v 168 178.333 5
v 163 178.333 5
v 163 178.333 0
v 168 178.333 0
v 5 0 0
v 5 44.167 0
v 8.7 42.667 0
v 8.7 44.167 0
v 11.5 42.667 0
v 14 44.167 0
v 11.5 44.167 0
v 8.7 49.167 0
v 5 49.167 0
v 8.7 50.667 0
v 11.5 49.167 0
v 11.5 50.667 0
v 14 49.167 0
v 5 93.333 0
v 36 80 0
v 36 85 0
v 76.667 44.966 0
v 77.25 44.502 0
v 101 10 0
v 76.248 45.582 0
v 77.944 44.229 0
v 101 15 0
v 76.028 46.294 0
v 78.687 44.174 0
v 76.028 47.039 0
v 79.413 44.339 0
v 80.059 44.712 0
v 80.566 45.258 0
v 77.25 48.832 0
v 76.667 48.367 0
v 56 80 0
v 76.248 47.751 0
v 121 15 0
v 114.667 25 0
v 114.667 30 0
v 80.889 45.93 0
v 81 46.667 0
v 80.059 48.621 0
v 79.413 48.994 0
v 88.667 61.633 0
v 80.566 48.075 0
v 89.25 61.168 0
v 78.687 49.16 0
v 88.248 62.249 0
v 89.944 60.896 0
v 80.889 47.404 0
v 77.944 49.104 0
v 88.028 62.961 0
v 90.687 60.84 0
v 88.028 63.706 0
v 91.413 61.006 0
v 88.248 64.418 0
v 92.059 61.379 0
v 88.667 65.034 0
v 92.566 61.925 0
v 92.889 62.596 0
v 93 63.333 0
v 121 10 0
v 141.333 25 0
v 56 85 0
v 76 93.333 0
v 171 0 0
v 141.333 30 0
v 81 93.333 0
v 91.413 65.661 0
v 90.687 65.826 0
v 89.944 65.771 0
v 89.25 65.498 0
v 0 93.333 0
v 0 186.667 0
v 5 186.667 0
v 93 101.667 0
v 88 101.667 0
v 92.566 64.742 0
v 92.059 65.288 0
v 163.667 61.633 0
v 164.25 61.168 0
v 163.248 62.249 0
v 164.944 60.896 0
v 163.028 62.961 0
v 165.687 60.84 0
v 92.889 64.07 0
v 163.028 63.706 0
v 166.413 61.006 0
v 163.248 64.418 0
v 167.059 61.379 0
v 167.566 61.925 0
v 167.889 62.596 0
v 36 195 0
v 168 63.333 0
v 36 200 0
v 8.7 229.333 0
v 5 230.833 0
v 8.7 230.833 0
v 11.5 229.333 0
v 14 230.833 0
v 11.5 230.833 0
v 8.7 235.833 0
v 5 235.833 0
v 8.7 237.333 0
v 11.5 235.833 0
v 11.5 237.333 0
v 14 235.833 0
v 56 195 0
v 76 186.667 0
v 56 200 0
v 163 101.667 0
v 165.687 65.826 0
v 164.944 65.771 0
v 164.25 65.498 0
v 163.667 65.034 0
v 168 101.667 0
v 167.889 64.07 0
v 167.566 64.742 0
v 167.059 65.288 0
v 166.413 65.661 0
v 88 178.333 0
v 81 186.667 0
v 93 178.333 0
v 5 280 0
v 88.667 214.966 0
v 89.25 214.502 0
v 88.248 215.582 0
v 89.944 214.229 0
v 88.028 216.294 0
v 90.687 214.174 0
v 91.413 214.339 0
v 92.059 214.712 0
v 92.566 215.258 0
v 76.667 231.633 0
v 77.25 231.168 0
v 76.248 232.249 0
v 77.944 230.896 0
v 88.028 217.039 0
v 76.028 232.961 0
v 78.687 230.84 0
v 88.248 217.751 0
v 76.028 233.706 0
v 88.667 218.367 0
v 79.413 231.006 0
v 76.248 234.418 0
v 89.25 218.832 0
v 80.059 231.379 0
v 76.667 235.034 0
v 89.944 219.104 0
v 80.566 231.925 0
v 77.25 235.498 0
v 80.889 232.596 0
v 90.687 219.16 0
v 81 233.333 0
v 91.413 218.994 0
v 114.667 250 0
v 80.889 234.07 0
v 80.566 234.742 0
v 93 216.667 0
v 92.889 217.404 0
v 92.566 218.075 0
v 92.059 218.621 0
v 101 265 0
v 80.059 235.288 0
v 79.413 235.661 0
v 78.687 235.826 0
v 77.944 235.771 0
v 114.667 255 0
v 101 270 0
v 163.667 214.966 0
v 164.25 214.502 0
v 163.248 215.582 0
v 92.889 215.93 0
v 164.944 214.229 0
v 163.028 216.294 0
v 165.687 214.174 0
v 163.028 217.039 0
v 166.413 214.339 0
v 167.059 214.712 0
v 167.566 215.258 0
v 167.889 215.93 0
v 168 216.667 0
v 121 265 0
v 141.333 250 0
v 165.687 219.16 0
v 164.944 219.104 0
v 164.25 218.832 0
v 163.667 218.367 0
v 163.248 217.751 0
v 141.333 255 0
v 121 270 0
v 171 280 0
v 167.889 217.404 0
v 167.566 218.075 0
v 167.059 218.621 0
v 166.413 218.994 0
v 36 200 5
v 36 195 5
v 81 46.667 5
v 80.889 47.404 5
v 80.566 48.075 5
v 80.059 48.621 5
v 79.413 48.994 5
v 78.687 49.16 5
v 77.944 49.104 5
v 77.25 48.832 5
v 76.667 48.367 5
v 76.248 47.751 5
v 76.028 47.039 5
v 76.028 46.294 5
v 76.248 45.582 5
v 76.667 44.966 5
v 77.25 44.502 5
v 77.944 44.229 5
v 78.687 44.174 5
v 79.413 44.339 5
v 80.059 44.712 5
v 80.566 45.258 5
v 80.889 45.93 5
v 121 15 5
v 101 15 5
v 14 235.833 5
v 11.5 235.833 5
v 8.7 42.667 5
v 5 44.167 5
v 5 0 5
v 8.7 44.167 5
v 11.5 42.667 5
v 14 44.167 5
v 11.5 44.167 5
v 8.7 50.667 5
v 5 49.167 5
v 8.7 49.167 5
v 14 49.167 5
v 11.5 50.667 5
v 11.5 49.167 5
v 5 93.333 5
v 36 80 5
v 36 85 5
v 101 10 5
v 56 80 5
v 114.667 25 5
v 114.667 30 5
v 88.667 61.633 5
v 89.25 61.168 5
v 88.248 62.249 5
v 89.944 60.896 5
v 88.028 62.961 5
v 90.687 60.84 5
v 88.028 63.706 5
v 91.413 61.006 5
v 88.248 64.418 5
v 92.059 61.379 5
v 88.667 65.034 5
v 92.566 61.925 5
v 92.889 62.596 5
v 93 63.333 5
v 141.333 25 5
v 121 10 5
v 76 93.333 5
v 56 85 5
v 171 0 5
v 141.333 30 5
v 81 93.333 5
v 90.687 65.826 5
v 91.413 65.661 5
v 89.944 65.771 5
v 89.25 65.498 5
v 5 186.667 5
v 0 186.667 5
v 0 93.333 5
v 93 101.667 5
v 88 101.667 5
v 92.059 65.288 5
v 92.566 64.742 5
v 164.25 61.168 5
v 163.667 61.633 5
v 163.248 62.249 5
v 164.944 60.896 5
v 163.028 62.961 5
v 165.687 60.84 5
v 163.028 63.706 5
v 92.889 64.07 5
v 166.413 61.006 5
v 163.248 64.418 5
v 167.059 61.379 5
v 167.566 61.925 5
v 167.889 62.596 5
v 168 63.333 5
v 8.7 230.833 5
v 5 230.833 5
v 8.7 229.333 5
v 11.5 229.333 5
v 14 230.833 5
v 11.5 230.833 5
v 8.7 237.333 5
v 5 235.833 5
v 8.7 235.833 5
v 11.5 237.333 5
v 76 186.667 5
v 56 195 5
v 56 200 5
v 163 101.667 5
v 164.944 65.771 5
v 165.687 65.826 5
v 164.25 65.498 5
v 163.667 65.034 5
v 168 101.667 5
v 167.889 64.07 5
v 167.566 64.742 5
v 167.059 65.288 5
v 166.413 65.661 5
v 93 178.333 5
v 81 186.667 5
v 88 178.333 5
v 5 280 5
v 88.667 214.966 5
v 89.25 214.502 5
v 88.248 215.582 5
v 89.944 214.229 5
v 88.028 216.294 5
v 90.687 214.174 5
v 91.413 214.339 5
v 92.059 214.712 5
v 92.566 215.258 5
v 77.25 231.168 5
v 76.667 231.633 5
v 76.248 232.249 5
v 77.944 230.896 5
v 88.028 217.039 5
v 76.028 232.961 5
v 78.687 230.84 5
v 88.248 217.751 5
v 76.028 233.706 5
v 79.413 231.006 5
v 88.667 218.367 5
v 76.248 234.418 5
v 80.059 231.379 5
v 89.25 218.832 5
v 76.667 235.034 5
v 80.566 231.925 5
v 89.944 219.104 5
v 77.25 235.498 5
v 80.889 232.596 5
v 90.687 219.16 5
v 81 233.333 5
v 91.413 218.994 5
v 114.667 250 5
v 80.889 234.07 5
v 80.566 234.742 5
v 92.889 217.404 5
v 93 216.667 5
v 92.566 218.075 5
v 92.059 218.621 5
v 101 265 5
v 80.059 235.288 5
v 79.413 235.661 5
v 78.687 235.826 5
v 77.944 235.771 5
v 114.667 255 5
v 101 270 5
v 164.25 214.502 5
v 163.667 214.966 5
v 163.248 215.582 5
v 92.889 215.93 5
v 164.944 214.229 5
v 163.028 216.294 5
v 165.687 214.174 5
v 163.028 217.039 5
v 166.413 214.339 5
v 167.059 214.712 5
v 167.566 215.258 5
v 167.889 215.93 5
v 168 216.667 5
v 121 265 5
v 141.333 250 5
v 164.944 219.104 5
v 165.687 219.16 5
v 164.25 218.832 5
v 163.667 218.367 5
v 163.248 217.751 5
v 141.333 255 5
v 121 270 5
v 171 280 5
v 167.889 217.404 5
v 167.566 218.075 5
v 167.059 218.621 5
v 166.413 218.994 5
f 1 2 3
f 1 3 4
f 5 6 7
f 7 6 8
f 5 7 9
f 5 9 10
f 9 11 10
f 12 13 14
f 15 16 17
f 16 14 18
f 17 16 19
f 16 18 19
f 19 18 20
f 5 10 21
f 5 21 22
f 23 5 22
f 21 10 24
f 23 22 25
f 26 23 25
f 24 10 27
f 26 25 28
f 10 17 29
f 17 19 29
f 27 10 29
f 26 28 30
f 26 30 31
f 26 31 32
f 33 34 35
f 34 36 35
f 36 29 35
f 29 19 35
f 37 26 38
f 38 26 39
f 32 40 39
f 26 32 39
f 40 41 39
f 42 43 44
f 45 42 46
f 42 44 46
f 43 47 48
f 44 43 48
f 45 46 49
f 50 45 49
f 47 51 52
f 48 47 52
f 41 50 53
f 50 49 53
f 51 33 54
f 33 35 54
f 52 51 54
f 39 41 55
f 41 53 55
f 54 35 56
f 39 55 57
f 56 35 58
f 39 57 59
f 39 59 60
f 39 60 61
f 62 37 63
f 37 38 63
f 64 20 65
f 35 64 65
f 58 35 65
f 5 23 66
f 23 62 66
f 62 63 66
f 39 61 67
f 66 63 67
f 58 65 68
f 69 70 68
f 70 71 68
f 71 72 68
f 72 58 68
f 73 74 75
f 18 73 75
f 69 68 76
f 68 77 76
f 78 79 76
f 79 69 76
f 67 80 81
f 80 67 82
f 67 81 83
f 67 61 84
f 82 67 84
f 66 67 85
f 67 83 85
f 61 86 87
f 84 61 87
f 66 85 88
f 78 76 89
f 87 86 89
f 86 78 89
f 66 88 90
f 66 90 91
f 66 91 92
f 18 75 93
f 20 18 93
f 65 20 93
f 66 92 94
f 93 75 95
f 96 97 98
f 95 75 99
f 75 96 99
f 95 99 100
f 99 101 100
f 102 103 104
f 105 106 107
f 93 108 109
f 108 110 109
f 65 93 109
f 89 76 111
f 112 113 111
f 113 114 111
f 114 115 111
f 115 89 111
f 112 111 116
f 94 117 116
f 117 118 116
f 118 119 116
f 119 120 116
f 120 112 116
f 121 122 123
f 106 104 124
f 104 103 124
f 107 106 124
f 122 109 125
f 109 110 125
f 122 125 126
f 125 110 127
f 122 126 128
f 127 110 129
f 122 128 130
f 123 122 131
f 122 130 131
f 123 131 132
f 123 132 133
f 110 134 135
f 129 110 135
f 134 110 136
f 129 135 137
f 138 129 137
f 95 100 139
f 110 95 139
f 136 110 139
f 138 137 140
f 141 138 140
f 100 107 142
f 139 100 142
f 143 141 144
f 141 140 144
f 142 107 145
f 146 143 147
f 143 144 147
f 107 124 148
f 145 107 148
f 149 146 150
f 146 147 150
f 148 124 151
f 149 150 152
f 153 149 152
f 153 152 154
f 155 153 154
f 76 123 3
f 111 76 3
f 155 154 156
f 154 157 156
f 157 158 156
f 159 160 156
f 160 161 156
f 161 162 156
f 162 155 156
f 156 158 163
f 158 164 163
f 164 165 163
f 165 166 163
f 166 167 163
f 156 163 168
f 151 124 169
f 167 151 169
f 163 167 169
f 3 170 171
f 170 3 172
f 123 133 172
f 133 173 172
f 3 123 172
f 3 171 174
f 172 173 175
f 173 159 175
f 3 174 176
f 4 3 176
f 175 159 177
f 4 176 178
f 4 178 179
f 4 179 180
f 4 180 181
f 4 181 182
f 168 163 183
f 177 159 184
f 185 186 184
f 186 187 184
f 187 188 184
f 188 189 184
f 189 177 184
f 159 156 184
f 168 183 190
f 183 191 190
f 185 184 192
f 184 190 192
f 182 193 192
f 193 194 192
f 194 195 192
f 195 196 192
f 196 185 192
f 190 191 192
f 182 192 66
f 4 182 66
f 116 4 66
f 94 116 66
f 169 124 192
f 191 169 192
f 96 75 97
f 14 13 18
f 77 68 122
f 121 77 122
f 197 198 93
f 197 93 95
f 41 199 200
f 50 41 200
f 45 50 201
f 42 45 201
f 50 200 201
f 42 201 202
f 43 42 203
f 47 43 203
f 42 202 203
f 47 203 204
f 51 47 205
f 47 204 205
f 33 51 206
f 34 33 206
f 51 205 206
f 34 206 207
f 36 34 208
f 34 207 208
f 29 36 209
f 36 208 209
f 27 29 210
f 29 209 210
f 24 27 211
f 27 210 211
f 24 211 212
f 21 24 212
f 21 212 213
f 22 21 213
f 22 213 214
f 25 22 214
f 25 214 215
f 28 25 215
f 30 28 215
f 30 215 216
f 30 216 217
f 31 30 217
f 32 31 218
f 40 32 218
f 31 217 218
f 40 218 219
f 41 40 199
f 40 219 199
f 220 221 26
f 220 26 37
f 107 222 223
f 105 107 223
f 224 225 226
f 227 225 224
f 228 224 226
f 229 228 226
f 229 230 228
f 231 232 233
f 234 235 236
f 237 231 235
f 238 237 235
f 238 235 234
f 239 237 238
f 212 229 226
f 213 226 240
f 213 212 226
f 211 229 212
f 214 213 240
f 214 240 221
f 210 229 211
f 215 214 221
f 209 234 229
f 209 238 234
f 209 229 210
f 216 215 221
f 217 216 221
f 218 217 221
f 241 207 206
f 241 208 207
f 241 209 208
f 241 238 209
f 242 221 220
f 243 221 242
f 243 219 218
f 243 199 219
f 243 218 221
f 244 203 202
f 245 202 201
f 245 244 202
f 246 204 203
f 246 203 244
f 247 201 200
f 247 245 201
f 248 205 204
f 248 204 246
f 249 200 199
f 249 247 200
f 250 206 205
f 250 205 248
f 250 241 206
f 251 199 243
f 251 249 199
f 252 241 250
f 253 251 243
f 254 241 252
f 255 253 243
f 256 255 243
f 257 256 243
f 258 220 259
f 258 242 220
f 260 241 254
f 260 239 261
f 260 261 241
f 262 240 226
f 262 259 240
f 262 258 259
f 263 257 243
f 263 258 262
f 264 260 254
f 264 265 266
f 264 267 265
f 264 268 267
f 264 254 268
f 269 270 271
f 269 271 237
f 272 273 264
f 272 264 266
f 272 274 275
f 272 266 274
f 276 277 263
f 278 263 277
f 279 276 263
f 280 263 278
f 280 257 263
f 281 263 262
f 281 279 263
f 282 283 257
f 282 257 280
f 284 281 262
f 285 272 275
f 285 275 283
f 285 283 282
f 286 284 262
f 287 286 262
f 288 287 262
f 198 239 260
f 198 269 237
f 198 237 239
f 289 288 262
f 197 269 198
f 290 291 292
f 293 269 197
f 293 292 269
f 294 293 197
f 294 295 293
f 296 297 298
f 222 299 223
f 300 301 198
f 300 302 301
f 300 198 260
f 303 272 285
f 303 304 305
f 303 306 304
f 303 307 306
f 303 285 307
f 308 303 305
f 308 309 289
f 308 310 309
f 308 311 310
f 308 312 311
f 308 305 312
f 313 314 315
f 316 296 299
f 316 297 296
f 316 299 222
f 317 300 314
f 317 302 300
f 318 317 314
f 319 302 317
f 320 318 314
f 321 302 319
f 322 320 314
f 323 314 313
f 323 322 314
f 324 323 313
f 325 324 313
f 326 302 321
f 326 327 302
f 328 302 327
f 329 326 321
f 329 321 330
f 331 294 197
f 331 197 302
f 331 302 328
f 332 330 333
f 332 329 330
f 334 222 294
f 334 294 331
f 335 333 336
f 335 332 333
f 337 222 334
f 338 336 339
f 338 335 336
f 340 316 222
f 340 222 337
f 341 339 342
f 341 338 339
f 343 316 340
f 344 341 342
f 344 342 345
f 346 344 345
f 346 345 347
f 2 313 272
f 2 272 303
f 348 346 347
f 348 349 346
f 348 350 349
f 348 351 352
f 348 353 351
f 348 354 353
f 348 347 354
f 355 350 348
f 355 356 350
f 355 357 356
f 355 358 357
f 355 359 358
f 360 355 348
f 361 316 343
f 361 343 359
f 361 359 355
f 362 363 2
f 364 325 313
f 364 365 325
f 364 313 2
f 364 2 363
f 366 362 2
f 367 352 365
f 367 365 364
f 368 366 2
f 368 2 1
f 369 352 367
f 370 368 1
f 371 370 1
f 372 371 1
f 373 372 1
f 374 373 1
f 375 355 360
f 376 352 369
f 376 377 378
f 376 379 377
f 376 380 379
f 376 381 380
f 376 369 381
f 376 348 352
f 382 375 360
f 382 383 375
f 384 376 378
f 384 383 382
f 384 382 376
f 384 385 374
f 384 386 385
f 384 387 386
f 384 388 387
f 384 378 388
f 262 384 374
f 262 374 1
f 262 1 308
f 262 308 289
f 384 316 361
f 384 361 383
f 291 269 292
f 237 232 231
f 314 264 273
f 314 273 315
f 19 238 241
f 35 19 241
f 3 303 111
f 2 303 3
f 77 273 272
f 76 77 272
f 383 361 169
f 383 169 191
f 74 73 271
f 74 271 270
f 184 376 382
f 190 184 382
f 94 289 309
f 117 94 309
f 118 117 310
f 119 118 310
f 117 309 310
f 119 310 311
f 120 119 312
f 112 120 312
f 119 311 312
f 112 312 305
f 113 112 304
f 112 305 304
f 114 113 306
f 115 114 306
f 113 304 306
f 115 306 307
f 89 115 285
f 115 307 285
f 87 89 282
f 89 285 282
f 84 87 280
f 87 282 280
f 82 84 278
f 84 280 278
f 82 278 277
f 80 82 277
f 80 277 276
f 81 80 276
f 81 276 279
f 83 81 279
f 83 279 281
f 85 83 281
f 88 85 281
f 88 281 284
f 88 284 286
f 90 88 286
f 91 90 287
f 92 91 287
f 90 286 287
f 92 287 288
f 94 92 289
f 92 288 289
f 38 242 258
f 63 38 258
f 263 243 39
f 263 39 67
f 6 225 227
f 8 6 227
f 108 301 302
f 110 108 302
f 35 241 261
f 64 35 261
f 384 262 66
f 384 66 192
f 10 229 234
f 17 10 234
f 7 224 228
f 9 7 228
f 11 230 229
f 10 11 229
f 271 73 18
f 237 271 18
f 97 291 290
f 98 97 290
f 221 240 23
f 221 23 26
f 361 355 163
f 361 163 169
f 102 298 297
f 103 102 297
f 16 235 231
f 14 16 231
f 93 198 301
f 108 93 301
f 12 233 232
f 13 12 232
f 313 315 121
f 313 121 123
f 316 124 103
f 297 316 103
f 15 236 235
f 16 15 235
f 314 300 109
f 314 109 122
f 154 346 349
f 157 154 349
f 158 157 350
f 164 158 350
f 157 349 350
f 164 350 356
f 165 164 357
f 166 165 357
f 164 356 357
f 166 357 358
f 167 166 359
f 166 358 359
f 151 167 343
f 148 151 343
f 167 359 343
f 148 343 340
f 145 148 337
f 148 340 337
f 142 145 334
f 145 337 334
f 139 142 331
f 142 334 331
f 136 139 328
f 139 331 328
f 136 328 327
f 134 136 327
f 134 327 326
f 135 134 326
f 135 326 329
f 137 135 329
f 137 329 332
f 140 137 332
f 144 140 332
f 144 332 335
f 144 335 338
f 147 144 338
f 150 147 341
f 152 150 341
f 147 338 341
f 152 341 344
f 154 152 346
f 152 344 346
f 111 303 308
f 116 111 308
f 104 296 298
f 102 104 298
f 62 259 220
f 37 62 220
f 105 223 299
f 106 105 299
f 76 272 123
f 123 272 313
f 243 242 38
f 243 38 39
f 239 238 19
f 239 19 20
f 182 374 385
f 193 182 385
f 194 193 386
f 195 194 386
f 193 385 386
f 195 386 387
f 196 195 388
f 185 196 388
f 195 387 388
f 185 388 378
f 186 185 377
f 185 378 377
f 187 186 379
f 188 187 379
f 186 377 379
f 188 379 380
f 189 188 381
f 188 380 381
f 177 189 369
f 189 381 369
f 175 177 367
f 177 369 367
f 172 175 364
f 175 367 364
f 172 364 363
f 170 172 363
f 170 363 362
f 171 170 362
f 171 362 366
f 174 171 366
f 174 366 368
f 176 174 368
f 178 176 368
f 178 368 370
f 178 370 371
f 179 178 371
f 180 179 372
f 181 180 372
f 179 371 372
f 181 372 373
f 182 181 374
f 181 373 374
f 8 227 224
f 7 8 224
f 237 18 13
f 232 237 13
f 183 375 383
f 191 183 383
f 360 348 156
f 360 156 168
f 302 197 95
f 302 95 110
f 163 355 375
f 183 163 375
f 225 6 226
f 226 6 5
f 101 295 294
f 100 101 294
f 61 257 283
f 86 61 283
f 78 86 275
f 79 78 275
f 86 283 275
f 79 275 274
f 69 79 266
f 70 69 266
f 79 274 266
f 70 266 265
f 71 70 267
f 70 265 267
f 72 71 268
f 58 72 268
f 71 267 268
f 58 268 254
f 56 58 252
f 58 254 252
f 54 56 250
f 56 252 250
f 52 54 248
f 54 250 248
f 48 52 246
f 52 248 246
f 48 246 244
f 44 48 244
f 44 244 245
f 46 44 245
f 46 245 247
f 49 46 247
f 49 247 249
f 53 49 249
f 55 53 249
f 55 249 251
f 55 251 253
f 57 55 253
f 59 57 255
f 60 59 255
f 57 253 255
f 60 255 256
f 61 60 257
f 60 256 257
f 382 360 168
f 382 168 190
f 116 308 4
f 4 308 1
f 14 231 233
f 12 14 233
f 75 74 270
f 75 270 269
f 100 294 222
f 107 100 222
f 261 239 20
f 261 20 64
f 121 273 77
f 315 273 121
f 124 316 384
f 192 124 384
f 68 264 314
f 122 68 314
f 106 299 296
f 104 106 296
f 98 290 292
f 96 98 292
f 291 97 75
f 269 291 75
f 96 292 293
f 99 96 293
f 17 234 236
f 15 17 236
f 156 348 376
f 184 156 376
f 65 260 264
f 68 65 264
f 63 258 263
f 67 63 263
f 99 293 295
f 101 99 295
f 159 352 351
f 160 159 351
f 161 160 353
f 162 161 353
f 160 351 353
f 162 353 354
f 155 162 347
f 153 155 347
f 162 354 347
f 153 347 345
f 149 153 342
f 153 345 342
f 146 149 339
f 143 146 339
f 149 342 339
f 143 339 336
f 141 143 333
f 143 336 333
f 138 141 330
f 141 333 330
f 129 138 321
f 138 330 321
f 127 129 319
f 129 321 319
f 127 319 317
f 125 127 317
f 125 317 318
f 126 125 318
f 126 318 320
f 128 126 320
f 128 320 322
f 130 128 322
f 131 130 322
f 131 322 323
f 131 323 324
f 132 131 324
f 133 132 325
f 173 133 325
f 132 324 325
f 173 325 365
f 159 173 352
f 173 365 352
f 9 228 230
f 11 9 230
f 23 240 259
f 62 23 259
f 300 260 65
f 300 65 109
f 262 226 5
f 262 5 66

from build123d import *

# Parameters (mm, degrees)
CROQUIS1_W              = 5
CROQUIS1_H              = 93.333333334
SALIENTE_EXTRUIR1_DEPTH = 5
CORTAR_EXTRUIR1_DEPTH   = 5
CROQUIS3_W              = 5
CROQUIS3_H              = 93.333333334
CORTAR_EXTRUIR2_DEPTH   = 5
CROQUIS4_R              = 2.5
CORTAR_EXTRUIR3_DEPTH   = 5
CROQUIS5_W              = 20
CROQUIS5_H              = 5
CORTAR_EXTRUIR4_DEPTH   = 5
CROQUIS6_W              = 40
CROQUIS6_H              = 280
SALIENTE_EXTRUIR2_DEPTH = 5
CROQUIS7_W              = 5
CROQUIS7_H              = 76.666666666
CROQUIS7_W_2            = 26.666666666
CROQUIS7_H_2            = 5
CROQUIS7_R              = 2.5
CORTAR_EXTRUIR5_DEPTH   = 5


with BuildPart() as part:
    # Croquis1 → Saliente-Extruir1 (new body)
    with BuildSketch(Plane.XY):
        Polygon((5, 93.333333333), (5, 0), (131, 0), (131, 93.333333333), (131, 186.666666667), (131, 280), (5, 280), (5, 186.666666667), align=None)
        with Locations((2.5, 140)):
            Rectangle(CROQUIS1_W, CROQUIS1_H)
    extrude(amount=SALIENTE_EXTRUIR1_DEPTH)

    # Croquis2 → Cortar-Extruir1 (cut)
    with BuildSketch(Plane.XY.offset(5)):
        Polygon((8.7, 235.833333333), (5, 235.833333333), (5, 230.833333333), (8.7, 230.833333333), (8.7, 229.333333333), (11.5, 229.333333333), (11.5, 230.833333333), (14, 230.833333333), (14, 235.833333333), (11.5, 235.833333333), (11.5, 237.333333333), (8.7, 237.333333333), align=None)
        Polygon((8.7, 49.166666667), (5, 49.166666667), (5, 44.166666667), (8.7, 44.166666667), (8.7, 42.666666667), (11.5, 42.666666667), (11.5, 44.166666667), (14, 44.166666667), (14, 49.166666667), (11.5, 49.166666667), (11.5, 50.666666667), (8.7, 50.666666667), align=None)
    extrude(amount=-CORTAR_EXTRUIR1_DEPTH, mode=Mode.SUBTRACT)

    # Croquis3 → Cortar-Extruir2 (cut)
    with BuildSketch(Plane.XY.offset(5)):
        with Locations((78.5, 140)):
            Rectangle(CROQUIS3_W, CROQUIS3_H)
    extrude(amount=-CORTAR_EXTRUIR2_DEPTH, mode=Mode.SUBTRACT)

    # Croquis4 → Cortar-Extruir3 (cut)
    with BuildSketch(Plane.XY.offset(5)):
        with Locations((78.5, 233.333333333)):
            Circle(CROQUIS4_R)
        with Locations((78.5, 46.666666667)):
            Circle(CROQUIS4_R)
    extrude(amount=-CORTAR_EXTRUIR3_DEPTH, mode=Mode.SUBTRACT)

    # Croquis5 → Cortar-Extruir4 (cut)
    with BuildSketch(Plane.XY.offset(5)):
        with Locations((46, 197.5)):
            Rectangle(CROQUIS5_W, CROQUIS5_H)
        with Locations((111, 267.5)):
            Rectangle(CROQUIS5_W, CROQUIS5_H)
        with Locations((46, 82.5)):
            Rectangle(CROQUIS5_W, CROQUIS5_H)
        with Locations((111, 12.5)):
            Rectangle(CROQUIS5_W, CROQUIS5_H)
    extrude(amount=-CORTAR_EXTRUIR4_DEPTH, mode=Mode.SUBTRACT)

    # Croquis6 → Saliente-Extruir2 (add)
    with BuildSketch(Plane.XY.offset(5)):
        with Locations((151, 140)):
            Rectangle(CROQUIS6_W, CROQUIS6_H)
    extrude(amount=-SALIENTE_EXTRUIR2_DEPTH)

    # Croquis7 → Cortar-Extruir5 (cut)
    with BuildSketch(Plane.XY.offset(5)):
        with Locations((90.5, 140)):
            Rectangle(CROQUIS7_W, CROQUIS7_H)
        with Locations((165.5, 140)):
            Rectangle(CROQUIS7_W, CROQUIS7_H)
        with Locations((128, 27.5)):
            Rectangle(CROQUIS7_W_2, CROQUIS7_H_2)
        with Locations((128, 252.5)):
            Rectangle(CROQUIS7_W_2, CROQUIS7_H_2)
        with Locations((90.5, 216.666666667)):
            Circle(CROQUIS7_R)
        with Locations((165.5, 216.666666667)):
            Circle(CROQUIS7_R)
        with Locations((165.5, 63.333333333)):
            Circle(CROQUIS7_R)
        with Locations((90.5, 63.333333333)):
            Circle(CROQUIS7_R)
    extrude(amount=-CORTAR_EXTRUIR5_DEPTH, mode=Mode.SUBTRACT)


solid = part.part
